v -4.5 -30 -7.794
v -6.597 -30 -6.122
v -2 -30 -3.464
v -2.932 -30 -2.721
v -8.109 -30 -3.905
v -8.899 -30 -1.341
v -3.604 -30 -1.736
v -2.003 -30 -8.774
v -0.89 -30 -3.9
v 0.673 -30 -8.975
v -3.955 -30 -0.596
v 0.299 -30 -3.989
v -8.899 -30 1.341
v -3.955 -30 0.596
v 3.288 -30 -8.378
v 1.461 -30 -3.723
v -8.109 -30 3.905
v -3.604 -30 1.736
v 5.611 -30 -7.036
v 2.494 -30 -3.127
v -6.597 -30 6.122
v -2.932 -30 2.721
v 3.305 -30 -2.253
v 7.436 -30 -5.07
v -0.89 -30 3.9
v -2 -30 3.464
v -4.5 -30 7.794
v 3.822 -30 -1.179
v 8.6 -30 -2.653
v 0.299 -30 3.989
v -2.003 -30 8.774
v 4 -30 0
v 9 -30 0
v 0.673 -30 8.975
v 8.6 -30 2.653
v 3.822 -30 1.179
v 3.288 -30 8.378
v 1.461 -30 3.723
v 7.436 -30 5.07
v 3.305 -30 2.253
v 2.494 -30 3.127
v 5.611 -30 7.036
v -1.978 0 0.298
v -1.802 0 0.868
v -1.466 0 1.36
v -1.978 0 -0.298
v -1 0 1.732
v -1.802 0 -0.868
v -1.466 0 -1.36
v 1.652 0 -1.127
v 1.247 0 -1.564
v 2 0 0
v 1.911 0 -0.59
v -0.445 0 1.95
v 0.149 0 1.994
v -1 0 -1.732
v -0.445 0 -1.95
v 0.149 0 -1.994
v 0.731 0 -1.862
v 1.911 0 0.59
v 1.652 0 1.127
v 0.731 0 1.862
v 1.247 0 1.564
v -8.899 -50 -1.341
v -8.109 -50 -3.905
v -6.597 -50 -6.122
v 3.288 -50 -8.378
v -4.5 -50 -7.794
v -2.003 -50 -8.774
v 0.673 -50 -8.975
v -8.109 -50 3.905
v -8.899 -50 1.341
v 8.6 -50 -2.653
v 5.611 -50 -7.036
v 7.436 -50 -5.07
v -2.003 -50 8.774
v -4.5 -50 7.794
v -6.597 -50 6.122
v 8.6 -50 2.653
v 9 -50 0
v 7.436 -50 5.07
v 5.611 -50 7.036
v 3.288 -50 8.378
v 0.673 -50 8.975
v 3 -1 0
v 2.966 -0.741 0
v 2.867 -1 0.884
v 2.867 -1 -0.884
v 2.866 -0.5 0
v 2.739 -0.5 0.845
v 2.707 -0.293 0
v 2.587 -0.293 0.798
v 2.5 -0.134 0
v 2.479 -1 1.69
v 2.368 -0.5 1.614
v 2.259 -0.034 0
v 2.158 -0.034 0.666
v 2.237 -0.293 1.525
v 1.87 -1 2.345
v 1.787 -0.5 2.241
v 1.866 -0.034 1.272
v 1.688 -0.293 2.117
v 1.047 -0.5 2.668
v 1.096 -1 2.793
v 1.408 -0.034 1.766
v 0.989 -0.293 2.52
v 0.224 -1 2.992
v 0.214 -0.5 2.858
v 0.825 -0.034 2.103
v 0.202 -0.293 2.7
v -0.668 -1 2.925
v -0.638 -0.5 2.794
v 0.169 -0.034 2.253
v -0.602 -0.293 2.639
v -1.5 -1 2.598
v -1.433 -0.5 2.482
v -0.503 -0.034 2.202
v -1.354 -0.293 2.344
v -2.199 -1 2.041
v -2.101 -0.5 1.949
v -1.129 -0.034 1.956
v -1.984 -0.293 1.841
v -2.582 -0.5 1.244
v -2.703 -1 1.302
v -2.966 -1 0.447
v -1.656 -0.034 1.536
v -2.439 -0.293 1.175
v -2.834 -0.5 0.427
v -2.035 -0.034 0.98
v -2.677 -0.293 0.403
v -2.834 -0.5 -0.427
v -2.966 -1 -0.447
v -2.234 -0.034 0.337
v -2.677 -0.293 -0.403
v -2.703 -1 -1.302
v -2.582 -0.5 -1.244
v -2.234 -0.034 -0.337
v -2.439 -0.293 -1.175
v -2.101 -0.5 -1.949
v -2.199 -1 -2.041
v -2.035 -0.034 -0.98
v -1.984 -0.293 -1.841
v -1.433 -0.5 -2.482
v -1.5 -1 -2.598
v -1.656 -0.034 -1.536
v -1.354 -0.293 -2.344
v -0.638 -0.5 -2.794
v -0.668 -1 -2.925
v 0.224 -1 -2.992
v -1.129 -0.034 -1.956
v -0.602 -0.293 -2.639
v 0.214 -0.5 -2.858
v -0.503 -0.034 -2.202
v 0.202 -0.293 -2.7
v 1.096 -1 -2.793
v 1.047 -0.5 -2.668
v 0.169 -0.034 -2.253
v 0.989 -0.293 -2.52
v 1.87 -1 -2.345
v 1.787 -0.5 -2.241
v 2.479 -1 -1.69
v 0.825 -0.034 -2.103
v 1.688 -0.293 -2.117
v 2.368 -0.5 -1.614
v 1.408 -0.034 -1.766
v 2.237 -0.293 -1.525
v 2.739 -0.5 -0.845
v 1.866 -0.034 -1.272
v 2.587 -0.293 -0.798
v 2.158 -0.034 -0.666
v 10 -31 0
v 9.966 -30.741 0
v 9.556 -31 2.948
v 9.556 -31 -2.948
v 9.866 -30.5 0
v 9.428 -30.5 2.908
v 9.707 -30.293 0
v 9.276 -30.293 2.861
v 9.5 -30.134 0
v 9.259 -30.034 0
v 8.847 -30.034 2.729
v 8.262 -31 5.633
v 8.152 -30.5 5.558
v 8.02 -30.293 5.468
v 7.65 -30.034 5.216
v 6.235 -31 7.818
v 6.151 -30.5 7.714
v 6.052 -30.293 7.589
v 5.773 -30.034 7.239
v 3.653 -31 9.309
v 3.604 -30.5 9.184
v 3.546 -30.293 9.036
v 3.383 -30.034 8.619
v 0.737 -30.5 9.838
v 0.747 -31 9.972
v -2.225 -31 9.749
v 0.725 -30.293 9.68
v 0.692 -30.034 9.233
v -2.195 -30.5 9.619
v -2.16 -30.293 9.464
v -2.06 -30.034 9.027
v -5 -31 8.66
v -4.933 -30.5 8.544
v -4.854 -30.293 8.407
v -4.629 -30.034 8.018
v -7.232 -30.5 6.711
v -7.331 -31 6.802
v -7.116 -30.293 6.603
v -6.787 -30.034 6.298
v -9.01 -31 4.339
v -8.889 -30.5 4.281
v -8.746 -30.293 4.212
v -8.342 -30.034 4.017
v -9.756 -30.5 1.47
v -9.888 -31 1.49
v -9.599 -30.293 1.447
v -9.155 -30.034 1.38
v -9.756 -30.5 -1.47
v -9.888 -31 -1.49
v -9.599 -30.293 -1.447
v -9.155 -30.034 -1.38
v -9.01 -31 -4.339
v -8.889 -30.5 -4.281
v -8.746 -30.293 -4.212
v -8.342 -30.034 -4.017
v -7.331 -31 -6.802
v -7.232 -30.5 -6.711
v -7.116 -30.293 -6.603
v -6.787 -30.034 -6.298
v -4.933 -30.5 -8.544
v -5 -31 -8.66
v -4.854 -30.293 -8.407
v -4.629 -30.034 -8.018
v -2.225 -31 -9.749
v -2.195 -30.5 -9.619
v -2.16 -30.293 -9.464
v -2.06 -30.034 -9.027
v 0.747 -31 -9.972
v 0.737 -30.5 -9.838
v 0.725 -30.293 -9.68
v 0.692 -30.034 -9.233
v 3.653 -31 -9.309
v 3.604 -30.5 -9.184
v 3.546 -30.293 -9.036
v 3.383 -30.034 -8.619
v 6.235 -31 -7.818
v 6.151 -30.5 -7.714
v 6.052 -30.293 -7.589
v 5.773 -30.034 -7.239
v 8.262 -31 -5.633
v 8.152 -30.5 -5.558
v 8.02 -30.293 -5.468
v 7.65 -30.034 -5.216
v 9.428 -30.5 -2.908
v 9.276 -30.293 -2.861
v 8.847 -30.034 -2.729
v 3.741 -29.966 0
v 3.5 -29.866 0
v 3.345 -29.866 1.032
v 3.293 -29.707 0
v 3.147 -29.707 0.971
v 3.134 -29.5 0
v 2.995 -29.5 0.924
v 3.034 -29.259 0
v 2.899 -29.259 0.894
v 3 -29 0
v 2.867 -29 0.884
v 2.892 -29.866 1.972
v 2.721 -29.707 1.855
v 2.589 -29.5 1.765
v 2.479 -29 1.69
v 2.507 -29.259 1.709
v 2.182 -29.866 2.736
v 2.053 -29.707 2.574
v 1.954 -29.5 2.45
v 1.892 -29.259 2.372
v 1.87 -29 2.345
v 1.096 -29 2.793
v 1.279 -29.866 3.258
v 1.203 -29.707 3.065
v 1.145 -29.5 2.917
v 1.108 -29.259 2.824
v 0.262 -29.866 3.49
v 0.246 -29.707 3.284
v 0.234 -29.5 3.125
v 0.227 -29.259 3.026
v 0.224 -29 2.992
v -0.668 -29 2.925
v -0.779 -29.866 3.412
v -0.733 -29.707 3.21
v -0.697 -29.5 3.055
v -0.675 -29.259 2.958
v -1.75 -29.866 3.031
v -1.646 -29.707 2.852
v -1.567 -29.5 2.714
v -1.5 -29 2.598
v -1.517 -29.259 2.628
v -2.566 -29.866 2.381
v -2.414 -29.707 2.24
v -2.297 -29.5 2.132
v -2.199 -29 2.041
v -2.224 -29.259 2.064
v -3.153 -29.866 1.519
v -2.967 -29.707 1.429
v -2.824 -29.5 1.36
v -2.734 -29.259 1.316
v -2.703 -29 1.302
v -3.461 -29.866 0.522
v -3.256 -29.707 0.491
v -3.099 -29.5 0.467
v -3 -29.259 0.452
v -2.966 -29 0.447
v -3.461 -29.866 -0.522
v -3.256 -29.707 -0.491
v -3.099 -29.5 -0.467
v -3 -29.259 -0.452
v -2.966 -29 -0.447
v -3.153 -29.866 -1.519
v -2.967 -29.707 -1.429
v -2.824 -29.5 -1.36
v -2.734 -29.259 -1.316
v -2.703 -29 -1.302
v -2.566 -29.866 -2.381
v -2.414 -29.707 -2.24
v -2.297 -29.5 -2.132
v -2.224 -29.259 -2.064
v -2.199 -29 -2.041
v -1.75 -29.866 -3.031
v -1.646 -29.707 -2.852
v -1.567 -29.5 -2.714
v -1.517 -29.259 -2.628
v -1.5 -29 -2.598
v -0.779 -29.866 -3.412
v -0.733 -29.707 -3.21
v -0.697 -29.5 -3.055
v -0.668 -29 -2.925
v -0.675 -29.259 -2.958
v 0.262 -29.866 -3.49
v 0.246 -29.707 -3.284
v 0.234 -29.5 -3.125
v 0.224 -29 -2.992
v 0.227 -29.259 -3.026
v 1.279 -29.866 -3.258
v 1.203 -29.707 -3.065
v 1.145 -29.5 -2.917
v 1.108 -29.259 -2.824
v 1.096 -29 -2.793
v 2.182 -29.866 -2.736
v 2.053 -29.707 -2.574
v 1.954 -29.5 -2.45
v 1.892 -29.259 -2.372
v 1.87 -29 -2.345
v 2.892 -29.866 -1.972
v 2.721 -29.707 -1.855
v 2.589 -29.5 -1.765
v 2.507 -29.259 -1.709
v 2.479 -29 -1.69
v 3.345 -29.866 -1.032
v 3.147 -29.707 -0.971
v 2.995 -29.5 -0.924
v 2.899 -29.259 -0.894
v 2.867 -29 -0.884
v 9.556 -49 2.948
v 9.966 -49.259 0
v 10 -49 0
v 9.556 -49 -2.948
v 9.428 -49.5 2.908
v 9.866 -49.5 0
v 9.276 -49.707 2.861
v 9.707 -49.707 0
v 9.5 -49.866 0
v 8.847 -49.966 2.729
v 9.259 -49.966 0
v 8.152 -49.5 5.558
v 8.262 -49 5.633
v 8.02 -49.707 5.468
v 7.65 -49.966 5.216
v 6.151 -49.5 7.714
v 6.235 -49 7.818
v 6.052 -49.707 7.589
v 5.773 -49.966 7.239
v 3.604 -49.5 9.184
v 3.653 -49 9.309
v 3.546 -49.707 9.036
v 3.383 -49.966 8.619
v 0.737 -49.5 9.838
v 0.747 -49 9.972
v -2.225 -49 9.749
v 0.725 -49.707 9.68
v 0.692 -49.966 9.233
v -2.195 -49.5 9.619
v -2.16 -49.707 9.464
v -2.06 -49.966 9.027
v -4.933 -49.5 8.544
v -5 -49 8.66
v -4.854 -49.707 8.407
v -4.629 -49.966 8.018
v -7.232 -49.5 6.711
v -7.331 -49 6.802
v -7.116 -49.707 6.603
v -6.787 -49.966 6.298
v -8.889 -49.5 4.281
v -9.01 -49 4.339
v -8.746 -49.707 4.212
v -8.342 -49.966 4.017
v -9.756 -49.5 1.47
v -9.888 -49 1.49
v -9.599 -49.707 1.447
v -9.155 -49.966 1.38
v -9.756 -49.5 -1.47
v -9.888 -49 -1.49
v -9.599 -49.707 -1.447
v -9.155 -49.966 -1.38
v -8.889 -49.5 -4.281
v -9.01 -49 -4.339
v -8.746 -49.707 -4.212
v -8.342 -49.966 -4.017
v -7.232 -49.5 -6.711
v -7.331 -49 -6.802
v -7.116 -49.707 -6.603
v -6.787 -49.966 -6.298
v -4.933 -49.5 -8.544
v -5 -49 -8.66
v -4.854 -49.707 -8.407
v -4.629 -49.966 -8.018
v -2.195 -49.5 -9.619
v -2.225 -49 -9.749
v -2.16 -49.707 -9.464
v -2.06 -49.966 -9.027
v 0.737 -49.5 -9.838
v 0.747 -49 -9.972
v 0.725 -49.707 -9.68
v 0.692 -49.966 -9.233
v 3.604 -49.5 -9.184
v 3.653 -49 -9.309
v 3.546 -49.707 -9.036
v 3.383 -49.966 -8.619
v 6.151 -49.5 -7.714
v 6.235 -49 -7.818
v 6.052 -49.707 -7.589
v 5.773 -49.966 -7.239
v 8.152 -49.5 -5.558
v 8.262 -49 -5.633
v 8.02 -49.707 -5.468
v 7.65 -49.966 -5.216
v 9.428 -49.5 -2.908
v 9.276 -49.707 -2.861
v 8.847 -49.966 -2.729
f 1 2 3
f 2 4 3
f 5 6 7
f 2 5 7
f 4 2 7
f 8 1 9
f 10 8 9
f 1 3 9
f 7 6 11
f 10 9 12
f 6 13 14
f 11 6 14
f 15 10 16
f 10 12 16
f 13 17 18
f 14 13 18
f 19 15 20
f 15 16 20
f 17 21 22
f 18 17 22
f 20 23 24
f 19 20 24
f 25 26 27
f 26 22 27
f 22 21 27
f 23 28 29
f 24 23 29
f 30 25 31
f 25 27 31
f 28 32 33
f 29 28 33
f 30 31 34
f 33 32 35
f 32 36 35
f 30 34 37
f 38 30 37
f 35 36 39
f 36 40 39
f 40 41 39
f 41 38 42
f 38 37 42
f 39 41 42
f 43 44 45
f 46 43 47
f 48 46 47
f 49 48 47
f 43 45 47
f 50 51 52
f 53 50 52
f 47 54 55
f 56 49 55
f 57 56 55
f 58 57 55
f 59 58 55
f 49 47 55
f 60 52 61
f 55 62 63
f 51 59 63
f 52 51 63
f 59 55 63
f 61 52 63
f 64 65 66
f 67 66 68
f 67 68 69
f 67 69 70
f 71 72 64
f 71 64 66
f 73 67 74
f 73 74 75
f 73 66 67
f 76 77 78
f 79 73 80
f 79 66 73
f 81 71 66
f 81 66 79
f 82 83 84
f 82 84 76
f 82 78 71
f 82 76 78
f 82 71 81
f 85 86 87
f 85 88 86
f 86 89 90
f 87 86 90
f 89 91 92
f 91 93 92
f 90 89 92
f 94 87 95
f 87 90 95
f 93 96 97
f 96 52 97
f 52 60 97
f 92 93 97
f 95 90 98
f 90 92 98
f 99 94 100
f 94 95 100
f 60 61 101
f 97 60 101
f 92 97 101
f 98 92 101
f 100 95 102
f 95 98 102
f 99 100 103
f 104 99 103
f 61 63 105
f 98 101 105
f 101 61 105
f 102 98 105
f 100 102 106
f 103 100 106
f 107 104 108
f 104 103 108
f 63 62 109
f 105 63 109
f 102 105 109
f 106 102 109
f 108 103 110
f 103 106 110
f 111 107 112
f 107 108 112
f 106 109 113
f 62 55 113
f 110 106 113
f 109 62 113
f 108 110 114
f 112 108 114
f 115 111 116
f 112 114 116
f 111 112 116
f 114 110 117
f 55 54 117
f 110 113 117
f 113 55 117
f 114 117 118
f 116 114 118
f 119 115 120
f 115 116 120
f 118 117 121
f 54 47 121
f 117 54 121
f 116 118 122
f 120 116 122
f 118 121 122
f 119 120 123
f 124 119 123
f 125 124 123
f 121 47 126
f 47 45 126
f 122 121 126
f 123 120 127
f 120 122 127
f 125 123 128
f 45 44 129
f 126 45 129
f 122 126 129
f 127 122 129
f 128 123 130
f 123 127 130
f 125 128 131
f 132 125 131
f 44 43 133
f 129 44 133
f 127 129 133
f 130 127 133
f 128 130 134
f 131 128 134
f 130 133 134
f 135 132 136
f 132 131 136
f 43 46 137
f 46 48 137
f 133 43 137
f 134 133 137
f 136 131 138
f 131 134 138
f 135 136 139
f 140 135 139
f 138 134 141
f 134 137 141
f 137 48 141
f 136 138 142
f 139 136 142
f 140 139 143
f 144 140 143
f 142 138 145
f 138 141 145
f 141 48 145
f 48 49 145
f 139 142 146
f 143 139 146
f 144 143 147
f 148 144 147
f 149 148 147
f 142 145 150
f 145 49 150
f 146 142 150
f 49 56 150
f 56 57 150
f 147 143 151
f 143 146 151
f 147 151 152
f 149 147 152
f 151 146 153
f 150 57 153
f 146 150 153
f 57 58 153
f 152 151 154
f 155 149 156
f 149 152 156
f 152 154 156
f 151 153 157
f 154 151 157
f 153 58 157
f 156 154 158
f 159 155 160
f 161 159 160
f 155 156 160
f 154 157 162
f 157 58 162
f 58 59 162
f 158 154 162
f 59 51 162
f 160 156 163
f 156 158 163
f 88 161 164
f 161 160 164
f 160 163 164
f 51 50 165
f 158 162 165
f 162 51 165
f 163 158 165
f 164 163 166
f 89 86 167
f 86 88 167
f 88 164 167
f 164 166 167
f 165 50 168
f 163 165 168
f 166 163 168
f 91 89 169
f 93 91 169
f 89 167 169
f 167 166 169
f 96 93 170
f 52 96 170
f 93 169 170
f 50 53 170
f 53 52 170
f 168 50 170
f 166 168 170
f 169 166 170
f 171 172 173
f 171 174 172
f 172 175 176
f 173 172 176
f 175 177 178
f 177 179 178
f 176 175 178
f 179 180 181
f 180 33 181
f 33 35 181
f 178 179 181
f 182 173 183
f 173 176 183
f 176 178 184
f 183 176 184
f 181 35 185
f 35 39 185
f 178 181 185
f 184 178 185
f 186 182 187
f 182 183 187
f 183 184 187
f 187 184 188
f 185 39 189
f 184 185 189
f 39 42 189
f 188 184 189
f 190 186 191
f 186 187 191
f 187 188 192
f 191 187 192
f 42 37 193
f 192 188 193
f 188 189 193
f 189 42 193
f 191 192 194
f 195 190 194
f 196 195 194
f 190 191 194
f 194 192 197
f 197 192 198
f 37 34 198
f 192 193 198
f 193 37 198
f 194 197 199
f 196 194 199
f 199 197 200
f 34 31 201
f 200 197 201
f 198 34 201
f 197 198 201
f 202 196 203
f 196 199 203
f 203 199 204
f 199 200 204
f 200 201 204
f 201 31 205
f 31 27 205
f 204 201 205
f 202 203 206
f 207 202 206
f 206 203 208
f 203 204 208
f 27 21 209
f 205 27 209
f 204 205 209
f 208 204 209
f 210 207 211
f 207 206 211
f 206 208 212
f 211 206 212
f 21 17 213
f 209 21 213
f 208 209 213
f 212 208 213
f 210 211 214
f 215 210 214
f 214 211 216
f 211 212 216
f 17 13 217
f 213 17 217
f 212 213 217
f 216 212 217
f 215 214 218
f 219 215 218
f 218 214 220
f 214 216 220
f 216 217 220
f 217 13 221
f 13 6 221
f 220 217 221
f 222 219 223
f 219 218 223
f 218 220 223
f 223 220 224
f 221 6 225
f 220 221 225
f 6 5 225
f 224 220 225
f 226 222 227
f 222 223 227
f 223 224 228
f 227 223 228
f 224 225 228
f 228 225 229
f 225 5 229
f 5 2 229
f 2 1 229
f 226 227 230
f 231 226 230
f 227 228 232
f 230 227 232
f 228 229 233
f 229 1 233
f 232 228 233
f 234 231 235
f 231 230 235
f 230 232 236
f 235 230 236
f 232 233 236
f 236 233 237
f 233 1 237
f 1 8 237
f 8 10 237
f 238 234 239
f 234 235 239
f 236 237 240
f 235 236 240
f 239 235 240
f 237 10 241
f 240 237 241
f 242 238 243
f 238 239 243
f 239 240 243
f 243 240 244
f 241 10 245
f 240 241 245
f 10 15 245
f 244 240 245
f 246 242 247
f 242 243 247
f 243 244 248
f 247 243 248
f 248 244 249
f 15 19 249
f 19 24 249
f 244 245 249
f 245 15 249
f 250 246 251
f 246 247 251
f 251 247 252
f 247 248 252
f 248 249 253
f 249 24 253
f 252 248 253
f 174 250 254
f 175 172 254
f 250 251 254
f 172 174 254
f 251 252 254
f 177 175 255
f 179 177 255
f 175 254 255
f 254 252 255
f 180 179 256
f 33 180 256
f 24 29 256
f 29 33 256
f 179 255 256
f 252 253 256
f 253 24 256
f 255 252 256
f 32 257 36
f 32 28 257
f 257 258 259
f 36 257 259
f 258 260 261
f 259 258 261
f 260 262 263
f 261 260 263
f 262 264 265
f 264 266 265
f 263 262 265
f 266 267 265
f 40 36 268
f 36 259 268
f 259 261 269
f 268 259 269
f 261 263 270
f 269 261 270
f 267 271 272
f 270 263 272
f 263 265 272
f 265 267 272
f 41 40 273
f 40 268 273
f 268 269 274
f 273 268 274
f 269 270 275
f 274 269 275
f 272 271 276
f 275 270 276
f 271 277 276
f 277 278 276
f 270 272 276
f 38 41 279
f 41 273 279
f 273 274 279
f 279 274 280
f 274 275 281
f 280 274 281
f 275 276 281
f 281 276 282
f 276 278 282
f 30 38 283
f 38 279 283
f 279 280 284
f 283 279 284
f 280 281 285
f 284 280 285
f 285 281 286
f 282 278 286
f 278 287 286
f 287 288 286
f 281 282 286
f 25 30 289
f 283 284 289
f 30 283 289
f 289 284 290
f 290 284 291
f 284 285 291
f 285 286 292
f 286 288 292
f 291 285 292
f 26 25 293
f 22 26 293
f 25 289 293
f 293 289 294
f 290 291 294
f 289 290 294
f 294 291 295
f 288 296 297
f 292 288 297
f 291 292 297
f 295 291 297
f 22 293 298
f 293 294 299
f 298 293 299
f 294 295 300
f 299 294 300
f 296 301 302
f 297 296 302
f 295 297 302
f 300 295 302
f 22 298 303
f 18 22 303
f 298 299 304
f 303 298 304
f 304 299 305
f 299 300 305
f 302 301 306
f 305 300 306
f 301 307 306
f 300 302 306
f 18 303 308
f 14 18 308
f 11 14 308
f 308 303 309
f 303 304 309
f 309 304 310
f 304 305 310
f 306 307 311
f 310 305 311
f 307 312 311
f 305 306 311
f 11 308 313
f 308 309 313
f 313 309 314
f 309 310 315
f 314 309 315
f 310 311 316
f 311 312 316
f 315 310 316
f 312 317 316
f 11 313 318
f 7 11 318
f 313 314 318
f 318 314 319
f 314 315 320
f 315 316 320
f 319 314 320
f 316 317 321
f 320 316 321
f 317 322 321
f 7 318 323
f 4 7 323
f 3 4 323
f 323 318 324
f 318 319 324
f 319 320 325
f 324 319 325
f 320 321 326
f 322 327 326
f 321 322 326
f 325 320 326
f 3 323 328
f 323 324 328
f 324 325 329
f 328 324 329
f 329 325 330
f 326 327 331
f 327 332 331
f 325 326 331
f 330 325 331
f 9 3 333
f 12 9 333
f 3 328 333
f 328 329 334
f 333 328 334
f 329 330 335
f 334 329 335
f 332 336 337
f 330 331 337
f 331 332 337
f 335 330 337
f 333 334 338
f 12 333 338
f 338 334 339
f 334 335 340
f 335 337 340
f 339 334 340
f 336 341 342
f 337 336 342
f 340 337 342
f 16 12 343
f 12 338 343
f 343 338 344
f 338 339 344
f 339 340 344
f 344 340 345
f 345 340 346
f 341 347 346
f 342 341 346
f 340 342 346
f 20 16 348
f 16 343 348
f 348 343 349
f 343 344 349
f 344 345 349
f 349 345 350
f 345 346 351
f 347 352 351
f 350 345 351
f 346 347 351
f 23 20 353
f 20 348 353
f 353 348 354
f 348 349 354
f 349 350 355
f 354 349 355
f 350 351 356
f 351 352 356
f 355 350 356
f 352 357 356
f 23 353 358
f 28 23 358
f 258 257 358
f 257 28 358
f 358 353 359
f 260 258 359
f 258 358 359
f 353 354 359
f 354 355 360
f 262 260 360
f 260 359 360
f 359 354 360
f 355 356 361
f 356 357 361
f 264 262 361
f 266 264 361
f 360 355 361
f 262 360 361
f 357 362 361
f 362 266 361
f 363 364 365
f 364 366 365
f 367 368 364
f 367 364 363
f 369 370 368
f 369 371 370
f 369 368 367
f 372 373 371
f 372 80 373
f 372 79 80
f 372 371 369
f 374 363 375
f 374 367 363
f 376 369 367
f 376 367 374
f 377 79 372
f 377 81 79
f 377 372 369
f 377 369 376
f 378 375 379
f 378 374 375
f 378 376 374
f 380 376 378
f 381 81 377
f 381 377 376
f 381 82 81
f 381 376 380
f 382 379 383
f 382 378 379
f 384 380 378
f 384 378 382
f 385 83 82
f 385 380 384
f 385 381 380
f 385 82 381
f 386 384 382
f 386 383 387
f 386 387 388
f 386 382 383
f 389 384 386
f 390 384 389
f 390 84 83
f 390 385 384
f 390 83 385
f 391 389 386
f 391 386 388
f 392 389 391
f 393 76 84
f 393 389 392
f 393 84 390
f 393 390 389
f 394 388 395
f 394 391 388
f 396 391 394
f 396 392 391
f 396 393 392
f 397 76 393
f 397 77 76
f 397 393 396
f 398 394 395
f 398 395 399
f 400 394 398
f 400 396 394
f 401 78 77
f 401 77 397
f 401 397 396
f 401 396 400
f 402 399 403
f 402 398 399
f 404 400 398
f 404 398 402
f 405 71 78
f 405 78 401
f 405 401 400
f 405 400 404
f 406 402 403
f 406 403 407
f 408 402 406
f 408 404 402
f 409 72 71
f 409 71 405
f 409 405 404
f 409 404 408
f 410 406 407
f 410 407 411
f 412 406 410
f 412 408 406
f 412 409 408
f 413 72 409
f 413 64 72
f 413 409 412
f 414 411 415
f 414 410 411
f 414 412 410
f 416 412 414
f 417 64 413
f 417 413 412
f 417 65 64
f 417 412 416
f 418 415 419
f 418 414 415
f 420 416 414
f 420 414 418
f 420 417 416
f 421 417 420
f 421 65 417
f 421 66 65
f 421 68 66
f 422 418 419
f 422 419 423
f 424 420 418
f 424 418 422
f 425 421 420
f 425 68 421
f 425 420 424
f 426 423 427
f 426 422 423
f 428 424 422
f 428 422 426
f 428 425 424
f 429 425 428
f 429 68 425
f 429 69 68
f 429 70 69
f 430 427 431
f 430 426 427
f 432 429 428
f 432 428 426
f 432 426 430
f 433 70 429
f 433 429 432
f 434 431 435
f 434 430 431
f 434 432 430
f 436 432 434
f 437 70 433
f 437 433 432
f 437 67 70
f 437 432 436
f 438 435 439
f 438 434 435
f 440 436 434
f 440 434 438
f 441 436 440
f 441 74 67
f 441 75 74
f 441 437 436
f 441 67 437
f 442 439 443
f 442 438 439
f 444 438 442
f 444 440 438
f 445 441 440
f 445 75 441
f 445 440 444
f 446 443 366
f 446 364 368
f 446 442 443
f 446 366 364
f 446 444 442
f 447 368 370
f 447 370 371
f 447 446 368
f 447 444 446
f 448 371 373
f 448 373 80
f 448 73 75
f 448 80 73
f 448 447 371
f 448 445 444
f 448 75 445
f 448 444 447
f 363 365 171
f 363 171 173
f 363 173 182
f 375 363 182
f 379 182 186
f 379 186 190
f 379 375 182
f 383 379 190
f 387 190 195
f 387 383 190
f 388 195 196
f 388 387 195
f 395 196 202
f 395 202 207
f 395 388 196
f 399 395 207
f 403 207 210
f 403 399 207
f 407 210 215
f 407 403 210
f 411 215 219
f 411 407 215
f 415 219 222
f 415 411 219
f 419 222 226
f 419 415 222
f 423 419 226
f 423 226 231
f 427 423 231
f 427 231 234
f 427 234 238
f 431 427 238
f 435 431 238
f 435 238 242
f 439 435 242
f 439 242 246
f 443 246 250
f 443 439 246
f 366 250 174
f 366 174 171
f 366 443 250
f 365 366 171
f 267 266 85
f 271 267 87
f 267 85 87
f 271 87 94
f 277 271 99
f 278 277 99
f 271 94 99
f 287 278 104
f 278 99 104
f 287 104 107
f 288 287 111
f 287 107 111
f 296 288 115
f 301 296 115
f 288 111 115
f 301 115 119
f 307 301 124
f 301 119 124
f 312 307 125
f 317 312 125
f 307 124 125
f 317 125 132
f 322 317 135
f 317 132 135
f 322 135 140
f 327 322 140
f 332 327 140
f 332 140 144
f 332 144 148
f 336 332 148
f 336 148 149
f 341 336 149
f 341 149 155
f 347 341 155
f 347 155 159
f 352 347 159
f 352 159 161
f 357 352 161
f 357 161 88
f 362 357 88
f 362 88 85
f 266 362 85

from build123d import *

# Parameters (mm, degrees)
F0_R     = 3
F1_DEPTH = 50
F2_R     = 1
F3_R     = 10
F3_R_2   = 3
F4_DEPTH = 20
F5_R     = 1


with BuildPart() as f1:
    # F0 (on Front) → F1 (new body)
    with BuildSketch(Plane.XZ):
        Circle(F0_R)
    extrude(amount=F1_DEPTH)

    # F2
    f2_edges = [f1.edges().sort_by_distance(p)[0] for p in [
        (-3, 0, 0),
    ]]
    fillet(f2_edges, radius=F2_R)

    # F3 (on face) → F4 (join)
    with BuildSketch(Plane.XZ.offset(50)):
        Circle(F3_R)
        Circle(F3_R_2, mode=Mode.SUBTRACT)
    extrude(amount=-F4_DEPTH)

    # F5
    f5_edges = [f1.edges().sort_by_distance(p)[0] for p in [
        (-3, -30, 0),
        (-10, -30, 0),
        (-10, -50, 0),
    ]]
    fillet(f5_edges, radius=F5_R)


solid = f1.part
